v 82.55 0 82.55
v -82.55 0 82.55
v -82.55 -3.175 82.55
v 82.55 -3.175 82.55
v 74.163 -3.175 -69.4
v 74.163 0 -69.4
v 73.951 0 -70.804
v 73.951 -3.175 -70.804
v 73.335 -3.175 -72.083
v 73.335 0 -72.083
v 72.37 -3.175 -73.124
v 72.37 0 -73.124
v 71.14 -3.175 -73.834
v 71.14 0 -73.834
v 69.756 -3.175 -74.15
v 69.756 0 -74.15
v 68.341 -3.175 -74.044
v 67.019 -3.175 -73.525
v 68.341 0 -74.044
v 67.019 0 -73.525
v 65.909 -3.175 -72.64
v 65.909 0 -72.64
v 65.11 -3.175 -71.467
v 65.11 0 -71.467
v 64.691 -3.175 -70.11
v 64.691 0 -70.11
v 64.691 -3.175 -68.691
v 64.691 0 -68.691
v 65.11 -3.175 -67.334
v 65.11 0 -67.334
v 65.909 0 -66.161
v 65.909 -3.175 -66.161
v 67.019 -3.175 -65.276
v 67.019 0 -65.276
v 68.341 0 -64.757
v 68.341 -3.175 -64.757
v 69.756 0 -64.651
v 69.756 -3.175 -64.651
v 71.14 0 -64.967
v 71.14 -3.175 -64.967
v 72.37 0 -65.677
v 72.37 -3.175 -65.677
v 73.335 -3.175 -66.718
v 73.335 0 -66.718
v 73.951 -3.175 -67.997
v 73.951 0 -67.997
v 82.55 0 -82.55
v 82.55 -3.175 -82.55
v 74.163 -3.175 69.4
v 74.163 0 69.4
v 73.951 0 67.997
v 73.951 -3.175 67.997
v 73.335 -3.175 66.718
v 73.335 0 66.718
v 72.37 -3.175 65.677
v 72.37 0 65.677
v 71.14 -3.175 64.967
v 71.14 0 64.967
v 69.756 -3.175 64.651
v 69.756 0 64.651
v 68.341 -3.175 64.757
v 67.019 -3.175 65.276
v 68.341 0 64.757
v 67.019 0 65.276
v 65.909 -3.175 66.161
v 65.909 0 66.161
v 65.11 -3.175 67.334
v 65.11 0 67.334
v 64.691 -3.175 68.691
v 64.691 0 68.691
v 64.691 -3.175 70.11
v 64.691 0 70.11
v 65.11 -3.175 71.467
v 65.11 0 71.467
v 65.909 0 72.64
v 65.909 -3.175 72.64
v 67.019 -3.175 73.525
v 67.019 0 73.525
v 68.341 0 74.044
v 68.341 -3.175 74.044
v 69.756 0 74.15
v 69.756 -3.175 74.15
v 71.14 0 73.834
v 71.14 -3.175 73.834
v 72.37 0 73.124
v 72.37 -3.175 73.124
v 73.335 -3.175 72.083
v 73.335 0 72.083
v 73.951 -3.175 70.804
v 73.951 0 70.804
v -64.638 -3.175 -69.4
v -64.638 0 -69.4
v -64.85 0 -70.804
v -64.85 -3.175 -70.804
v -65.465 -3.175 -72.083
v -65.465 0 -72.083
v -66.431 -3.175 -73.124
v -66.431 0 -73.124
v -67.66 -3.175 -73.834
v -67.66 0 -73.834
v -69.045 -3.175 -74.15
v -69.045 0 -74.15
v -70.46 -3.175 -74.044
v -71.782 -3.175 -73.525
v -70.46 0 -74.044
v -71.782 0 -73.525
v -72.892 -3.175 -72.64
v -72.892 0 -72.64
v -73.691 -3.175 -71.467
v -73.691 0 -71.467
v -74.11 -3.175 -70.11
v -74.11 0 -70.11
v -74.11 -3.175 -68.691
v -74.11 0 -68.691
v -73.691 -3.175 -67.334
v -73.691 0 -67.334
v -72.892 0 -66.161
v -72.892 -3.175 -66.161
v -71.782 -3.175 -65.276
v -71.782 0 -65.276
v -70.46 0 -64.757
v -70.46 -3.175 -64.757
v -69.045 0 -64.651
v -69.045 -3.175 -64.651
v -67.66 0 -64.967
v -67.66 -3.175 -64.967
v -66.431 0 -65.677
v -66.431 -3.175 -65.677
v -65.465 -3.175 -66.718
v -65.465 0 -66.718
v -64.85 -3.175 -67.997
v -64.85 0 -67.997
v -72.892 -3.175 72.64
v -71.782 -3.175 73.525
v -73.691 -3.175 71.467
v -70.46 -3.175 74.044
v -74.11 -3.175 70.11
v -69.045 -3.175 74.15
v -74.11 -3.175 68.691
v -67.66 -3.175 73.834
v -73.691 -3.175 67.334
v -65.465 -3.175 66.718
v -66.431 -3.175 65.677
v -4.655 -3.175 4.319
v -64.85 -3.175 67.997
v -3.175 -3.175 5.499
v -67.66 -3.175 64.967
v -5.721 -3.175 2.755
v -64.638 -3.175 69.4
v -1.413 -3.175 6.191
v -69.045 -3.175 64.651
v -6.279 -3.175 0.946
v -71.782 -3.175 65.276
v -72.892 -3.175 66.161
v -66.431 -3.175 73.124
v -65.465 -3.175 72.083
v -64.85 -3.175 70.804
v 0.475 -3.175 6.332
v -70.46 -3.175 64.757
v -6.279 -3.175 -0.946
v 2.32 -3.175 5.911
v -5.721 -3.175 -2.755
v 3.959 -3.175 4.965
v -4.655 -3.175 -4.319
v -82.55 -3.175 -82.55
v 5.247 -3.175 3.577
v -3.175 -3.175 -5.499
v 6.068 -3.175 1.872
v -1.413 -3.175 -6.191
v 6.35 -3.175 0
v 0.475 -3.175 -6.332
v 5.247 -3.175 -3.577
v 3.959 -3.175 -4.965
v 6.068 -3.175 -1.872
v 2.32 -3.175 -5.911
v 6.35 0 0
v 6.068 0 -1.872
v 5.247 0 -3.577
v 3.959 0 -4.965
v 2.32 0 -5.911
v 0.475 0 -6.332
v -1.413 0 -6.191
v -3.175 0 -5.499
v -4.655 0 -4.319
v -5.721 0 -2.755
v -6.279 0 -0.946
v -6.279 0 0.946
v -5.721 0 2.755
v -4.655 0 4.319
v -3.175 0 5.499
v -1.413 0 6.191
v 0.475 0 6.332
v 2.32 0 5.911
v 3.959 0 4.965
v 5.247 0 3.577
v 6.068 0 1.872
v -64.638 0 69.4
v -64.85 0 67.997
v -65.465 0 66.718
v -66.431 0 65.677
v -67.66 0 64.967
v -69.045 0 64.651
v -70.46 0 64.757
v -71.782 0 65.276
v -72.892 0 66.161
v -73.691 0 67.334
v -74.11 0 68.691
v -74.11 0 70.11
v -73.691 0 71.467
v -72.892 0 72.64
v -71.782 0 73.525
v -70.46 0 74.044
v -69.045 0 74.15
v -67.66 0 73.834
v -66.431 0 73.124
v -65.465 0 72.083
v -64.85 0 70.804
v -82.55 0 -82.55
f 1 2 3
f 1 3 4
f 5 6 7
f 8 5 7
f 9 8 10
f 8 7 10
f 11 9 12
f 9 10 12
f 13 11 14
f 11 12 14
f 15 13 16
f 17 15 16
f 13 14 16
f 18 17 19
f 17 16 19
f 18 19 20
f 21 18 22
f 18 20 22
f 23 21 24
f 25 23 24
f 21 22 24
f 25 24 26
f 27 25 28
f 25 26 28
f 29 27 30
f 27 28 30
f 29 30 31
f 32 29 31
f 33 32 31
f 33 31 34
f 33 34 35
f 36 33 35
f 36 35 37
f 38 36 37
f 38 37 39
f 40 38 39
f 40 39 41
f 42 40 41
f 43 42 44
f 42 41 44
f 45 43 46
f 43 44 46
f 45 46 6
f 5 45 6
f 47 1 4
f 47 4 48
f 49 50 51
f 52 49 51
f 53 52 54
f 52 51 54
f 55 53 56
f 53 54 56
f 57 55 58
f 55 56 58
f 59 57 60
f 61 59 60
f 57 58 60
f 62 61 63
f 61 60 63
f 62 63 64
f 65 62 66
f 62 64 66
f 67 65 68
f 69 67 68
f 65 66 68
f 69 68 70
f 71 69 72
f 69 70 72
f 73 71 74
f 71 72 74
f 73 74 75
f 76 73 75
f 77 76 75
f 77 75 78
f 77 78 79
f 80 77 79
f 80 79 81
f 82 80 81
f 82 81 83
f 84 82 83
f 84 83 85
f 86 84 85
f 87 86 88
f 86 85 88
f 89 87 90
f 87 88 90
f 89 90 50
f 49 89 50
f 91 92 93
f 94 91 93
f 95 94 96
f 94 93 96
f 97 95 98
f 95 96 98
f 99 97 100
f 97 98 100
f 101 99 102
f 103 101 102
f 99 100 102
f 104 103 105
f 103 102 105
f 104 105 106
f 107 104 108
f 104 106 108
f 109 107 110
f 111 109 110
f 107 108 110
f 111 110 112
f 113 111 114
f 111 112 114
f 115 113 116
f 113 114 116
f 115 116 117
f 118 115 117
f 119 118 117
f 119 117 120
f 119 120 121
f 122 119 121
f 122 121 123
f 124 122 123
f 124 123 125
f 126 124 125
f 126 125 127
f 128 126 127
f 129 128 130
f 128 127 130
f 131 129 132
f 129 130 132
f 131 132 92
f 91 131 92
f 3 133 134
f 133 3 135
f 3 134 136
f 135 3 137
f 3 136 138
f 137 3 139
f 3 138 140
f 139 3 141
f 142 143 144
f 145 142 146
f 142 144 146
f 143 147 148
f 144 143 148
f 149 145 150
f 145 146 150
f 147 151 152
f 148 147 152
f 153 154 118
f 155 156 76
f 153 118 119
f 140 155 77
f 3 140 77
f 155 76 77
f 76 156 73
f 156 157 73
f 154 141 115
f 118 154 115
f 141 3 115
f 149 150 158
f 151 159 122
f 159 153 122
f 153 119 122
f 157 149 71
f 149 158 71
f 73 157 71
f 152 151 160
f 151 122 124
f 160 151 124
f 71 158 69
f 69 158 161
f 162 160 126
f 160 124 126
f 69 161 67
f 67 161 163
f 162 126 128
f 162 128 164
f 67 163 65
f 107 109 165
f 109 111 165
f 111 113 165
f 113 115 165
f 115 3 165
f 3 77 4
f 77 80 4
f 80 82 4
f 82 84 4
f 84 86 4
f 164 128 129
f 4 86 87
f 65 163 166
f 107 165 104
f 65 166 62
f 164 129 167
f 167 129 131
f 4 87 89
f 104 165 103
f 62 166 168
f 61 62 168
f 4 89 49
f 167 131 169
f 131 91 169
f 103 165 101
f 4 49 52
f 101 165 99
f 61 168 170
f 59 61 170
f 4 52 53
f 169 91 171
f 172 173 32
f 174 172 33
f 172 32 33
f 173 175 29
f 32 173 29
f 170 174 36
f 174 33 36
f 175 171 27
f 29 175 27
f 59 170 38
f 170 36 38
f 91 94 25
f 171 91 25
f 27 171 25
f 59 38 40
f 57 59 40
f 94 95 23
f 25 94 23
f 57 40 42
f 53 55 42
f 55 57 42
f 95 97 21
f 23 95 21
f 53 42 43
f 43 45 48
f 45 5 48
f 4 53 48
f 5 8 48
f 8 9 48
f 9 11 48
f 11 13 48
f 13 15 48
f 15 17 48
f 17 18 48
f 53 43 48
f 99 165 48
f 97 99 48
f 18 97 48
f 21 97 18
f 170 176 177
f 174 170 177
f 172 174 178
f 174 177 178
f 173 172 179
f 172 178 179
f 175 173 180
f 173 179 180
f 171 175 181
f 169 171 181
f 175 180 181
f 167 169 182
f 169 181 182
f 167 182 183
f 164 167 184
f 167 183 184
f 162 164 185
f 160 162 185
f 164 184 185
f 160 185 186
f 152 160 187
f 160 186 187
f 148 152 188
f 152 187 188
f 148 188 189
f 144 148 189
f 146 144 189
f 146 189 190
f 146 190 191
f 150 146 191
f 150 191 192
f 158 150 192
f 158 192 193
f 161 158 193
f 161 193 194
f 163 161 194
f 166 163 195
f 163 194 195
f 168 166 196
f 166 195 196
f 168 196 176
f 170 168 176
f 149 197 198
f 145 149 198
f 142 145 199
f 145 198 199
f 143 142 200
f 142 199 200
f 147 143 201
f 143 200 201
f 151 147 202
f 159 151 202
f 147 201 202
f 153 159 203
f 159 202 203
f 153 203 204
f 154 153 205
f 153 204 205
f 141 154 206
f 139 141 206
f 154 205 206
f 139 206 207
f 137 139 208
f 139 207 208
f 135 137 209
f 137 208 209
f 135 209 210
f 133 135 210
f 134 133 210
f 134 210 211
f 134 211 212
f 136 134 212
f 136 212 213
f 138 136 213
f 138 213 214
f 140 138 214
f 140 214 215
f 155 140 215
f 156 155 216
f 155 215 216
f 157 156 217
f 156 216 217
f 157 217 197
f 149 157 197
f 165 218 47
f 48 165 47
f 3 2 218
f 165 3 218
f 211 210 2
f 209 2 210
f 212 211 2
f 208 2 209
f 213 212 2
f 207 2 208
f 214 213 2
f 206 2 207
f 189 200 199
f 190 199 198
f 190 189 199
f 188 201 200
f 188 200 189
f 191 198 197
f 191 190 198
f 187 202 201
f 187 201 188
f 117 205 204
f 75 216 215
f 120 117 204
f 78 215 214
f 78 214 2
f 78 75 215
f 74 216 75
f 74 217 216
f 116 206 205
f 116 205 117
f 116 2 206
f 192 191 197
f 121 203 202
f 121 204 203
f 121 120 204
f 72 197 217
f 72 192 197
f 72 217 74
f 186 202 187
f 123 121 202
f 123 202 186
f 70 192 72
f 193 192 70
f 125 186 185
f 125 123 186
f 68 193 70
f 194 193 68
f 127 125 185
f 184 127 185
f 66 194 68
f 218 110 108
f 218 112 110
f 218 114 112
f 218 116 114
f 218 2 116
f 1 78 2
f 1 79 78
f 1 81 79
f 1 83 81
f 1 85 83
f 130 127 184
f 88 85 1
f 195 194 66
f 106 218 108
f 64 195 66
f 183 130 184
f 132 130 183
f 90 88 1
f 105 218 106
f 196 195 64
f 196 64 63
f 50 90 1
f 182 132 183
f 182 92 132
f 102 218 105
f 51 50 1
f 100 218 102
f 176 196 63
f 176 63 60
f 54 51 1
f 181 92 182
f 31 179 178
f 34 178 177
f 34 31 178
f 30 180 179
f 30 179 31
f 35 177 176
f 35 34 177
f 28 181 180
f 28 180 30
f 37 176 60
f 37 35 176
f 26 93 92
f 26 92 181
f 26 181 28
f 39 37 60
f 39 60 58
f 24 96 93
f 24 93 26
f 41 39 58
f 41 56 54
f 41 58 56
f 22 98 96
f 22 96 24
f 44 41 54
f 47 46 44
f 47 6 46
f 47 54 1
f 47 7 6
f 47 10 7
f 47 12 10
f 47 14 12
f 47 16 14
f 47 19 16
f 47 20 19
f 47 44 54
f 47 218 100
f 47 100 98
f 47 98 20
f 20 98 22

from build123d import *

# Parameters (mm, degrees)
SKETCH1_W      = 165.1
SKETCH1_H      = 165.1
SKETCH1_R      = 6.35
SKETCH1_R_2    = 4.7625
EXTRUDE1_DEPTH = 3.175


with BuildPart() as part:
    # Sketch1 → Extrude1 (new body)
    with BuildSketch(Plane(origin=(0, 0, 0), x_dir=(1, 0, 0), z_dir=(0, 1, 0))):
        Rectangle(SKETCH1_W, SKETCH1_H)
        Circle(SKETCH1_R, mode=Mode.SUBTRACT)
        with Locations((-69.40042, 69.40042)):
            Circle(SKETCH1_R_2, mode=Mode.SUBTRACT)
        with Locations((69.40042, 69.40042)):
            Circle(SKETCH1_R_2, mode=Mode.SUBTRACT)
        with Locations((69.40042, -69.40042)):
            Circle(SKETCH1_R_2, mode=Mode.SUBTRACT)
        with Locations((-69.40042, -69.40042)):
            Circle(SKETCH1_R_2, mode=Mode.SUBTRACT)
    extrude(amount=-EXTRUDE1_DEPTH)


solid = part.part
